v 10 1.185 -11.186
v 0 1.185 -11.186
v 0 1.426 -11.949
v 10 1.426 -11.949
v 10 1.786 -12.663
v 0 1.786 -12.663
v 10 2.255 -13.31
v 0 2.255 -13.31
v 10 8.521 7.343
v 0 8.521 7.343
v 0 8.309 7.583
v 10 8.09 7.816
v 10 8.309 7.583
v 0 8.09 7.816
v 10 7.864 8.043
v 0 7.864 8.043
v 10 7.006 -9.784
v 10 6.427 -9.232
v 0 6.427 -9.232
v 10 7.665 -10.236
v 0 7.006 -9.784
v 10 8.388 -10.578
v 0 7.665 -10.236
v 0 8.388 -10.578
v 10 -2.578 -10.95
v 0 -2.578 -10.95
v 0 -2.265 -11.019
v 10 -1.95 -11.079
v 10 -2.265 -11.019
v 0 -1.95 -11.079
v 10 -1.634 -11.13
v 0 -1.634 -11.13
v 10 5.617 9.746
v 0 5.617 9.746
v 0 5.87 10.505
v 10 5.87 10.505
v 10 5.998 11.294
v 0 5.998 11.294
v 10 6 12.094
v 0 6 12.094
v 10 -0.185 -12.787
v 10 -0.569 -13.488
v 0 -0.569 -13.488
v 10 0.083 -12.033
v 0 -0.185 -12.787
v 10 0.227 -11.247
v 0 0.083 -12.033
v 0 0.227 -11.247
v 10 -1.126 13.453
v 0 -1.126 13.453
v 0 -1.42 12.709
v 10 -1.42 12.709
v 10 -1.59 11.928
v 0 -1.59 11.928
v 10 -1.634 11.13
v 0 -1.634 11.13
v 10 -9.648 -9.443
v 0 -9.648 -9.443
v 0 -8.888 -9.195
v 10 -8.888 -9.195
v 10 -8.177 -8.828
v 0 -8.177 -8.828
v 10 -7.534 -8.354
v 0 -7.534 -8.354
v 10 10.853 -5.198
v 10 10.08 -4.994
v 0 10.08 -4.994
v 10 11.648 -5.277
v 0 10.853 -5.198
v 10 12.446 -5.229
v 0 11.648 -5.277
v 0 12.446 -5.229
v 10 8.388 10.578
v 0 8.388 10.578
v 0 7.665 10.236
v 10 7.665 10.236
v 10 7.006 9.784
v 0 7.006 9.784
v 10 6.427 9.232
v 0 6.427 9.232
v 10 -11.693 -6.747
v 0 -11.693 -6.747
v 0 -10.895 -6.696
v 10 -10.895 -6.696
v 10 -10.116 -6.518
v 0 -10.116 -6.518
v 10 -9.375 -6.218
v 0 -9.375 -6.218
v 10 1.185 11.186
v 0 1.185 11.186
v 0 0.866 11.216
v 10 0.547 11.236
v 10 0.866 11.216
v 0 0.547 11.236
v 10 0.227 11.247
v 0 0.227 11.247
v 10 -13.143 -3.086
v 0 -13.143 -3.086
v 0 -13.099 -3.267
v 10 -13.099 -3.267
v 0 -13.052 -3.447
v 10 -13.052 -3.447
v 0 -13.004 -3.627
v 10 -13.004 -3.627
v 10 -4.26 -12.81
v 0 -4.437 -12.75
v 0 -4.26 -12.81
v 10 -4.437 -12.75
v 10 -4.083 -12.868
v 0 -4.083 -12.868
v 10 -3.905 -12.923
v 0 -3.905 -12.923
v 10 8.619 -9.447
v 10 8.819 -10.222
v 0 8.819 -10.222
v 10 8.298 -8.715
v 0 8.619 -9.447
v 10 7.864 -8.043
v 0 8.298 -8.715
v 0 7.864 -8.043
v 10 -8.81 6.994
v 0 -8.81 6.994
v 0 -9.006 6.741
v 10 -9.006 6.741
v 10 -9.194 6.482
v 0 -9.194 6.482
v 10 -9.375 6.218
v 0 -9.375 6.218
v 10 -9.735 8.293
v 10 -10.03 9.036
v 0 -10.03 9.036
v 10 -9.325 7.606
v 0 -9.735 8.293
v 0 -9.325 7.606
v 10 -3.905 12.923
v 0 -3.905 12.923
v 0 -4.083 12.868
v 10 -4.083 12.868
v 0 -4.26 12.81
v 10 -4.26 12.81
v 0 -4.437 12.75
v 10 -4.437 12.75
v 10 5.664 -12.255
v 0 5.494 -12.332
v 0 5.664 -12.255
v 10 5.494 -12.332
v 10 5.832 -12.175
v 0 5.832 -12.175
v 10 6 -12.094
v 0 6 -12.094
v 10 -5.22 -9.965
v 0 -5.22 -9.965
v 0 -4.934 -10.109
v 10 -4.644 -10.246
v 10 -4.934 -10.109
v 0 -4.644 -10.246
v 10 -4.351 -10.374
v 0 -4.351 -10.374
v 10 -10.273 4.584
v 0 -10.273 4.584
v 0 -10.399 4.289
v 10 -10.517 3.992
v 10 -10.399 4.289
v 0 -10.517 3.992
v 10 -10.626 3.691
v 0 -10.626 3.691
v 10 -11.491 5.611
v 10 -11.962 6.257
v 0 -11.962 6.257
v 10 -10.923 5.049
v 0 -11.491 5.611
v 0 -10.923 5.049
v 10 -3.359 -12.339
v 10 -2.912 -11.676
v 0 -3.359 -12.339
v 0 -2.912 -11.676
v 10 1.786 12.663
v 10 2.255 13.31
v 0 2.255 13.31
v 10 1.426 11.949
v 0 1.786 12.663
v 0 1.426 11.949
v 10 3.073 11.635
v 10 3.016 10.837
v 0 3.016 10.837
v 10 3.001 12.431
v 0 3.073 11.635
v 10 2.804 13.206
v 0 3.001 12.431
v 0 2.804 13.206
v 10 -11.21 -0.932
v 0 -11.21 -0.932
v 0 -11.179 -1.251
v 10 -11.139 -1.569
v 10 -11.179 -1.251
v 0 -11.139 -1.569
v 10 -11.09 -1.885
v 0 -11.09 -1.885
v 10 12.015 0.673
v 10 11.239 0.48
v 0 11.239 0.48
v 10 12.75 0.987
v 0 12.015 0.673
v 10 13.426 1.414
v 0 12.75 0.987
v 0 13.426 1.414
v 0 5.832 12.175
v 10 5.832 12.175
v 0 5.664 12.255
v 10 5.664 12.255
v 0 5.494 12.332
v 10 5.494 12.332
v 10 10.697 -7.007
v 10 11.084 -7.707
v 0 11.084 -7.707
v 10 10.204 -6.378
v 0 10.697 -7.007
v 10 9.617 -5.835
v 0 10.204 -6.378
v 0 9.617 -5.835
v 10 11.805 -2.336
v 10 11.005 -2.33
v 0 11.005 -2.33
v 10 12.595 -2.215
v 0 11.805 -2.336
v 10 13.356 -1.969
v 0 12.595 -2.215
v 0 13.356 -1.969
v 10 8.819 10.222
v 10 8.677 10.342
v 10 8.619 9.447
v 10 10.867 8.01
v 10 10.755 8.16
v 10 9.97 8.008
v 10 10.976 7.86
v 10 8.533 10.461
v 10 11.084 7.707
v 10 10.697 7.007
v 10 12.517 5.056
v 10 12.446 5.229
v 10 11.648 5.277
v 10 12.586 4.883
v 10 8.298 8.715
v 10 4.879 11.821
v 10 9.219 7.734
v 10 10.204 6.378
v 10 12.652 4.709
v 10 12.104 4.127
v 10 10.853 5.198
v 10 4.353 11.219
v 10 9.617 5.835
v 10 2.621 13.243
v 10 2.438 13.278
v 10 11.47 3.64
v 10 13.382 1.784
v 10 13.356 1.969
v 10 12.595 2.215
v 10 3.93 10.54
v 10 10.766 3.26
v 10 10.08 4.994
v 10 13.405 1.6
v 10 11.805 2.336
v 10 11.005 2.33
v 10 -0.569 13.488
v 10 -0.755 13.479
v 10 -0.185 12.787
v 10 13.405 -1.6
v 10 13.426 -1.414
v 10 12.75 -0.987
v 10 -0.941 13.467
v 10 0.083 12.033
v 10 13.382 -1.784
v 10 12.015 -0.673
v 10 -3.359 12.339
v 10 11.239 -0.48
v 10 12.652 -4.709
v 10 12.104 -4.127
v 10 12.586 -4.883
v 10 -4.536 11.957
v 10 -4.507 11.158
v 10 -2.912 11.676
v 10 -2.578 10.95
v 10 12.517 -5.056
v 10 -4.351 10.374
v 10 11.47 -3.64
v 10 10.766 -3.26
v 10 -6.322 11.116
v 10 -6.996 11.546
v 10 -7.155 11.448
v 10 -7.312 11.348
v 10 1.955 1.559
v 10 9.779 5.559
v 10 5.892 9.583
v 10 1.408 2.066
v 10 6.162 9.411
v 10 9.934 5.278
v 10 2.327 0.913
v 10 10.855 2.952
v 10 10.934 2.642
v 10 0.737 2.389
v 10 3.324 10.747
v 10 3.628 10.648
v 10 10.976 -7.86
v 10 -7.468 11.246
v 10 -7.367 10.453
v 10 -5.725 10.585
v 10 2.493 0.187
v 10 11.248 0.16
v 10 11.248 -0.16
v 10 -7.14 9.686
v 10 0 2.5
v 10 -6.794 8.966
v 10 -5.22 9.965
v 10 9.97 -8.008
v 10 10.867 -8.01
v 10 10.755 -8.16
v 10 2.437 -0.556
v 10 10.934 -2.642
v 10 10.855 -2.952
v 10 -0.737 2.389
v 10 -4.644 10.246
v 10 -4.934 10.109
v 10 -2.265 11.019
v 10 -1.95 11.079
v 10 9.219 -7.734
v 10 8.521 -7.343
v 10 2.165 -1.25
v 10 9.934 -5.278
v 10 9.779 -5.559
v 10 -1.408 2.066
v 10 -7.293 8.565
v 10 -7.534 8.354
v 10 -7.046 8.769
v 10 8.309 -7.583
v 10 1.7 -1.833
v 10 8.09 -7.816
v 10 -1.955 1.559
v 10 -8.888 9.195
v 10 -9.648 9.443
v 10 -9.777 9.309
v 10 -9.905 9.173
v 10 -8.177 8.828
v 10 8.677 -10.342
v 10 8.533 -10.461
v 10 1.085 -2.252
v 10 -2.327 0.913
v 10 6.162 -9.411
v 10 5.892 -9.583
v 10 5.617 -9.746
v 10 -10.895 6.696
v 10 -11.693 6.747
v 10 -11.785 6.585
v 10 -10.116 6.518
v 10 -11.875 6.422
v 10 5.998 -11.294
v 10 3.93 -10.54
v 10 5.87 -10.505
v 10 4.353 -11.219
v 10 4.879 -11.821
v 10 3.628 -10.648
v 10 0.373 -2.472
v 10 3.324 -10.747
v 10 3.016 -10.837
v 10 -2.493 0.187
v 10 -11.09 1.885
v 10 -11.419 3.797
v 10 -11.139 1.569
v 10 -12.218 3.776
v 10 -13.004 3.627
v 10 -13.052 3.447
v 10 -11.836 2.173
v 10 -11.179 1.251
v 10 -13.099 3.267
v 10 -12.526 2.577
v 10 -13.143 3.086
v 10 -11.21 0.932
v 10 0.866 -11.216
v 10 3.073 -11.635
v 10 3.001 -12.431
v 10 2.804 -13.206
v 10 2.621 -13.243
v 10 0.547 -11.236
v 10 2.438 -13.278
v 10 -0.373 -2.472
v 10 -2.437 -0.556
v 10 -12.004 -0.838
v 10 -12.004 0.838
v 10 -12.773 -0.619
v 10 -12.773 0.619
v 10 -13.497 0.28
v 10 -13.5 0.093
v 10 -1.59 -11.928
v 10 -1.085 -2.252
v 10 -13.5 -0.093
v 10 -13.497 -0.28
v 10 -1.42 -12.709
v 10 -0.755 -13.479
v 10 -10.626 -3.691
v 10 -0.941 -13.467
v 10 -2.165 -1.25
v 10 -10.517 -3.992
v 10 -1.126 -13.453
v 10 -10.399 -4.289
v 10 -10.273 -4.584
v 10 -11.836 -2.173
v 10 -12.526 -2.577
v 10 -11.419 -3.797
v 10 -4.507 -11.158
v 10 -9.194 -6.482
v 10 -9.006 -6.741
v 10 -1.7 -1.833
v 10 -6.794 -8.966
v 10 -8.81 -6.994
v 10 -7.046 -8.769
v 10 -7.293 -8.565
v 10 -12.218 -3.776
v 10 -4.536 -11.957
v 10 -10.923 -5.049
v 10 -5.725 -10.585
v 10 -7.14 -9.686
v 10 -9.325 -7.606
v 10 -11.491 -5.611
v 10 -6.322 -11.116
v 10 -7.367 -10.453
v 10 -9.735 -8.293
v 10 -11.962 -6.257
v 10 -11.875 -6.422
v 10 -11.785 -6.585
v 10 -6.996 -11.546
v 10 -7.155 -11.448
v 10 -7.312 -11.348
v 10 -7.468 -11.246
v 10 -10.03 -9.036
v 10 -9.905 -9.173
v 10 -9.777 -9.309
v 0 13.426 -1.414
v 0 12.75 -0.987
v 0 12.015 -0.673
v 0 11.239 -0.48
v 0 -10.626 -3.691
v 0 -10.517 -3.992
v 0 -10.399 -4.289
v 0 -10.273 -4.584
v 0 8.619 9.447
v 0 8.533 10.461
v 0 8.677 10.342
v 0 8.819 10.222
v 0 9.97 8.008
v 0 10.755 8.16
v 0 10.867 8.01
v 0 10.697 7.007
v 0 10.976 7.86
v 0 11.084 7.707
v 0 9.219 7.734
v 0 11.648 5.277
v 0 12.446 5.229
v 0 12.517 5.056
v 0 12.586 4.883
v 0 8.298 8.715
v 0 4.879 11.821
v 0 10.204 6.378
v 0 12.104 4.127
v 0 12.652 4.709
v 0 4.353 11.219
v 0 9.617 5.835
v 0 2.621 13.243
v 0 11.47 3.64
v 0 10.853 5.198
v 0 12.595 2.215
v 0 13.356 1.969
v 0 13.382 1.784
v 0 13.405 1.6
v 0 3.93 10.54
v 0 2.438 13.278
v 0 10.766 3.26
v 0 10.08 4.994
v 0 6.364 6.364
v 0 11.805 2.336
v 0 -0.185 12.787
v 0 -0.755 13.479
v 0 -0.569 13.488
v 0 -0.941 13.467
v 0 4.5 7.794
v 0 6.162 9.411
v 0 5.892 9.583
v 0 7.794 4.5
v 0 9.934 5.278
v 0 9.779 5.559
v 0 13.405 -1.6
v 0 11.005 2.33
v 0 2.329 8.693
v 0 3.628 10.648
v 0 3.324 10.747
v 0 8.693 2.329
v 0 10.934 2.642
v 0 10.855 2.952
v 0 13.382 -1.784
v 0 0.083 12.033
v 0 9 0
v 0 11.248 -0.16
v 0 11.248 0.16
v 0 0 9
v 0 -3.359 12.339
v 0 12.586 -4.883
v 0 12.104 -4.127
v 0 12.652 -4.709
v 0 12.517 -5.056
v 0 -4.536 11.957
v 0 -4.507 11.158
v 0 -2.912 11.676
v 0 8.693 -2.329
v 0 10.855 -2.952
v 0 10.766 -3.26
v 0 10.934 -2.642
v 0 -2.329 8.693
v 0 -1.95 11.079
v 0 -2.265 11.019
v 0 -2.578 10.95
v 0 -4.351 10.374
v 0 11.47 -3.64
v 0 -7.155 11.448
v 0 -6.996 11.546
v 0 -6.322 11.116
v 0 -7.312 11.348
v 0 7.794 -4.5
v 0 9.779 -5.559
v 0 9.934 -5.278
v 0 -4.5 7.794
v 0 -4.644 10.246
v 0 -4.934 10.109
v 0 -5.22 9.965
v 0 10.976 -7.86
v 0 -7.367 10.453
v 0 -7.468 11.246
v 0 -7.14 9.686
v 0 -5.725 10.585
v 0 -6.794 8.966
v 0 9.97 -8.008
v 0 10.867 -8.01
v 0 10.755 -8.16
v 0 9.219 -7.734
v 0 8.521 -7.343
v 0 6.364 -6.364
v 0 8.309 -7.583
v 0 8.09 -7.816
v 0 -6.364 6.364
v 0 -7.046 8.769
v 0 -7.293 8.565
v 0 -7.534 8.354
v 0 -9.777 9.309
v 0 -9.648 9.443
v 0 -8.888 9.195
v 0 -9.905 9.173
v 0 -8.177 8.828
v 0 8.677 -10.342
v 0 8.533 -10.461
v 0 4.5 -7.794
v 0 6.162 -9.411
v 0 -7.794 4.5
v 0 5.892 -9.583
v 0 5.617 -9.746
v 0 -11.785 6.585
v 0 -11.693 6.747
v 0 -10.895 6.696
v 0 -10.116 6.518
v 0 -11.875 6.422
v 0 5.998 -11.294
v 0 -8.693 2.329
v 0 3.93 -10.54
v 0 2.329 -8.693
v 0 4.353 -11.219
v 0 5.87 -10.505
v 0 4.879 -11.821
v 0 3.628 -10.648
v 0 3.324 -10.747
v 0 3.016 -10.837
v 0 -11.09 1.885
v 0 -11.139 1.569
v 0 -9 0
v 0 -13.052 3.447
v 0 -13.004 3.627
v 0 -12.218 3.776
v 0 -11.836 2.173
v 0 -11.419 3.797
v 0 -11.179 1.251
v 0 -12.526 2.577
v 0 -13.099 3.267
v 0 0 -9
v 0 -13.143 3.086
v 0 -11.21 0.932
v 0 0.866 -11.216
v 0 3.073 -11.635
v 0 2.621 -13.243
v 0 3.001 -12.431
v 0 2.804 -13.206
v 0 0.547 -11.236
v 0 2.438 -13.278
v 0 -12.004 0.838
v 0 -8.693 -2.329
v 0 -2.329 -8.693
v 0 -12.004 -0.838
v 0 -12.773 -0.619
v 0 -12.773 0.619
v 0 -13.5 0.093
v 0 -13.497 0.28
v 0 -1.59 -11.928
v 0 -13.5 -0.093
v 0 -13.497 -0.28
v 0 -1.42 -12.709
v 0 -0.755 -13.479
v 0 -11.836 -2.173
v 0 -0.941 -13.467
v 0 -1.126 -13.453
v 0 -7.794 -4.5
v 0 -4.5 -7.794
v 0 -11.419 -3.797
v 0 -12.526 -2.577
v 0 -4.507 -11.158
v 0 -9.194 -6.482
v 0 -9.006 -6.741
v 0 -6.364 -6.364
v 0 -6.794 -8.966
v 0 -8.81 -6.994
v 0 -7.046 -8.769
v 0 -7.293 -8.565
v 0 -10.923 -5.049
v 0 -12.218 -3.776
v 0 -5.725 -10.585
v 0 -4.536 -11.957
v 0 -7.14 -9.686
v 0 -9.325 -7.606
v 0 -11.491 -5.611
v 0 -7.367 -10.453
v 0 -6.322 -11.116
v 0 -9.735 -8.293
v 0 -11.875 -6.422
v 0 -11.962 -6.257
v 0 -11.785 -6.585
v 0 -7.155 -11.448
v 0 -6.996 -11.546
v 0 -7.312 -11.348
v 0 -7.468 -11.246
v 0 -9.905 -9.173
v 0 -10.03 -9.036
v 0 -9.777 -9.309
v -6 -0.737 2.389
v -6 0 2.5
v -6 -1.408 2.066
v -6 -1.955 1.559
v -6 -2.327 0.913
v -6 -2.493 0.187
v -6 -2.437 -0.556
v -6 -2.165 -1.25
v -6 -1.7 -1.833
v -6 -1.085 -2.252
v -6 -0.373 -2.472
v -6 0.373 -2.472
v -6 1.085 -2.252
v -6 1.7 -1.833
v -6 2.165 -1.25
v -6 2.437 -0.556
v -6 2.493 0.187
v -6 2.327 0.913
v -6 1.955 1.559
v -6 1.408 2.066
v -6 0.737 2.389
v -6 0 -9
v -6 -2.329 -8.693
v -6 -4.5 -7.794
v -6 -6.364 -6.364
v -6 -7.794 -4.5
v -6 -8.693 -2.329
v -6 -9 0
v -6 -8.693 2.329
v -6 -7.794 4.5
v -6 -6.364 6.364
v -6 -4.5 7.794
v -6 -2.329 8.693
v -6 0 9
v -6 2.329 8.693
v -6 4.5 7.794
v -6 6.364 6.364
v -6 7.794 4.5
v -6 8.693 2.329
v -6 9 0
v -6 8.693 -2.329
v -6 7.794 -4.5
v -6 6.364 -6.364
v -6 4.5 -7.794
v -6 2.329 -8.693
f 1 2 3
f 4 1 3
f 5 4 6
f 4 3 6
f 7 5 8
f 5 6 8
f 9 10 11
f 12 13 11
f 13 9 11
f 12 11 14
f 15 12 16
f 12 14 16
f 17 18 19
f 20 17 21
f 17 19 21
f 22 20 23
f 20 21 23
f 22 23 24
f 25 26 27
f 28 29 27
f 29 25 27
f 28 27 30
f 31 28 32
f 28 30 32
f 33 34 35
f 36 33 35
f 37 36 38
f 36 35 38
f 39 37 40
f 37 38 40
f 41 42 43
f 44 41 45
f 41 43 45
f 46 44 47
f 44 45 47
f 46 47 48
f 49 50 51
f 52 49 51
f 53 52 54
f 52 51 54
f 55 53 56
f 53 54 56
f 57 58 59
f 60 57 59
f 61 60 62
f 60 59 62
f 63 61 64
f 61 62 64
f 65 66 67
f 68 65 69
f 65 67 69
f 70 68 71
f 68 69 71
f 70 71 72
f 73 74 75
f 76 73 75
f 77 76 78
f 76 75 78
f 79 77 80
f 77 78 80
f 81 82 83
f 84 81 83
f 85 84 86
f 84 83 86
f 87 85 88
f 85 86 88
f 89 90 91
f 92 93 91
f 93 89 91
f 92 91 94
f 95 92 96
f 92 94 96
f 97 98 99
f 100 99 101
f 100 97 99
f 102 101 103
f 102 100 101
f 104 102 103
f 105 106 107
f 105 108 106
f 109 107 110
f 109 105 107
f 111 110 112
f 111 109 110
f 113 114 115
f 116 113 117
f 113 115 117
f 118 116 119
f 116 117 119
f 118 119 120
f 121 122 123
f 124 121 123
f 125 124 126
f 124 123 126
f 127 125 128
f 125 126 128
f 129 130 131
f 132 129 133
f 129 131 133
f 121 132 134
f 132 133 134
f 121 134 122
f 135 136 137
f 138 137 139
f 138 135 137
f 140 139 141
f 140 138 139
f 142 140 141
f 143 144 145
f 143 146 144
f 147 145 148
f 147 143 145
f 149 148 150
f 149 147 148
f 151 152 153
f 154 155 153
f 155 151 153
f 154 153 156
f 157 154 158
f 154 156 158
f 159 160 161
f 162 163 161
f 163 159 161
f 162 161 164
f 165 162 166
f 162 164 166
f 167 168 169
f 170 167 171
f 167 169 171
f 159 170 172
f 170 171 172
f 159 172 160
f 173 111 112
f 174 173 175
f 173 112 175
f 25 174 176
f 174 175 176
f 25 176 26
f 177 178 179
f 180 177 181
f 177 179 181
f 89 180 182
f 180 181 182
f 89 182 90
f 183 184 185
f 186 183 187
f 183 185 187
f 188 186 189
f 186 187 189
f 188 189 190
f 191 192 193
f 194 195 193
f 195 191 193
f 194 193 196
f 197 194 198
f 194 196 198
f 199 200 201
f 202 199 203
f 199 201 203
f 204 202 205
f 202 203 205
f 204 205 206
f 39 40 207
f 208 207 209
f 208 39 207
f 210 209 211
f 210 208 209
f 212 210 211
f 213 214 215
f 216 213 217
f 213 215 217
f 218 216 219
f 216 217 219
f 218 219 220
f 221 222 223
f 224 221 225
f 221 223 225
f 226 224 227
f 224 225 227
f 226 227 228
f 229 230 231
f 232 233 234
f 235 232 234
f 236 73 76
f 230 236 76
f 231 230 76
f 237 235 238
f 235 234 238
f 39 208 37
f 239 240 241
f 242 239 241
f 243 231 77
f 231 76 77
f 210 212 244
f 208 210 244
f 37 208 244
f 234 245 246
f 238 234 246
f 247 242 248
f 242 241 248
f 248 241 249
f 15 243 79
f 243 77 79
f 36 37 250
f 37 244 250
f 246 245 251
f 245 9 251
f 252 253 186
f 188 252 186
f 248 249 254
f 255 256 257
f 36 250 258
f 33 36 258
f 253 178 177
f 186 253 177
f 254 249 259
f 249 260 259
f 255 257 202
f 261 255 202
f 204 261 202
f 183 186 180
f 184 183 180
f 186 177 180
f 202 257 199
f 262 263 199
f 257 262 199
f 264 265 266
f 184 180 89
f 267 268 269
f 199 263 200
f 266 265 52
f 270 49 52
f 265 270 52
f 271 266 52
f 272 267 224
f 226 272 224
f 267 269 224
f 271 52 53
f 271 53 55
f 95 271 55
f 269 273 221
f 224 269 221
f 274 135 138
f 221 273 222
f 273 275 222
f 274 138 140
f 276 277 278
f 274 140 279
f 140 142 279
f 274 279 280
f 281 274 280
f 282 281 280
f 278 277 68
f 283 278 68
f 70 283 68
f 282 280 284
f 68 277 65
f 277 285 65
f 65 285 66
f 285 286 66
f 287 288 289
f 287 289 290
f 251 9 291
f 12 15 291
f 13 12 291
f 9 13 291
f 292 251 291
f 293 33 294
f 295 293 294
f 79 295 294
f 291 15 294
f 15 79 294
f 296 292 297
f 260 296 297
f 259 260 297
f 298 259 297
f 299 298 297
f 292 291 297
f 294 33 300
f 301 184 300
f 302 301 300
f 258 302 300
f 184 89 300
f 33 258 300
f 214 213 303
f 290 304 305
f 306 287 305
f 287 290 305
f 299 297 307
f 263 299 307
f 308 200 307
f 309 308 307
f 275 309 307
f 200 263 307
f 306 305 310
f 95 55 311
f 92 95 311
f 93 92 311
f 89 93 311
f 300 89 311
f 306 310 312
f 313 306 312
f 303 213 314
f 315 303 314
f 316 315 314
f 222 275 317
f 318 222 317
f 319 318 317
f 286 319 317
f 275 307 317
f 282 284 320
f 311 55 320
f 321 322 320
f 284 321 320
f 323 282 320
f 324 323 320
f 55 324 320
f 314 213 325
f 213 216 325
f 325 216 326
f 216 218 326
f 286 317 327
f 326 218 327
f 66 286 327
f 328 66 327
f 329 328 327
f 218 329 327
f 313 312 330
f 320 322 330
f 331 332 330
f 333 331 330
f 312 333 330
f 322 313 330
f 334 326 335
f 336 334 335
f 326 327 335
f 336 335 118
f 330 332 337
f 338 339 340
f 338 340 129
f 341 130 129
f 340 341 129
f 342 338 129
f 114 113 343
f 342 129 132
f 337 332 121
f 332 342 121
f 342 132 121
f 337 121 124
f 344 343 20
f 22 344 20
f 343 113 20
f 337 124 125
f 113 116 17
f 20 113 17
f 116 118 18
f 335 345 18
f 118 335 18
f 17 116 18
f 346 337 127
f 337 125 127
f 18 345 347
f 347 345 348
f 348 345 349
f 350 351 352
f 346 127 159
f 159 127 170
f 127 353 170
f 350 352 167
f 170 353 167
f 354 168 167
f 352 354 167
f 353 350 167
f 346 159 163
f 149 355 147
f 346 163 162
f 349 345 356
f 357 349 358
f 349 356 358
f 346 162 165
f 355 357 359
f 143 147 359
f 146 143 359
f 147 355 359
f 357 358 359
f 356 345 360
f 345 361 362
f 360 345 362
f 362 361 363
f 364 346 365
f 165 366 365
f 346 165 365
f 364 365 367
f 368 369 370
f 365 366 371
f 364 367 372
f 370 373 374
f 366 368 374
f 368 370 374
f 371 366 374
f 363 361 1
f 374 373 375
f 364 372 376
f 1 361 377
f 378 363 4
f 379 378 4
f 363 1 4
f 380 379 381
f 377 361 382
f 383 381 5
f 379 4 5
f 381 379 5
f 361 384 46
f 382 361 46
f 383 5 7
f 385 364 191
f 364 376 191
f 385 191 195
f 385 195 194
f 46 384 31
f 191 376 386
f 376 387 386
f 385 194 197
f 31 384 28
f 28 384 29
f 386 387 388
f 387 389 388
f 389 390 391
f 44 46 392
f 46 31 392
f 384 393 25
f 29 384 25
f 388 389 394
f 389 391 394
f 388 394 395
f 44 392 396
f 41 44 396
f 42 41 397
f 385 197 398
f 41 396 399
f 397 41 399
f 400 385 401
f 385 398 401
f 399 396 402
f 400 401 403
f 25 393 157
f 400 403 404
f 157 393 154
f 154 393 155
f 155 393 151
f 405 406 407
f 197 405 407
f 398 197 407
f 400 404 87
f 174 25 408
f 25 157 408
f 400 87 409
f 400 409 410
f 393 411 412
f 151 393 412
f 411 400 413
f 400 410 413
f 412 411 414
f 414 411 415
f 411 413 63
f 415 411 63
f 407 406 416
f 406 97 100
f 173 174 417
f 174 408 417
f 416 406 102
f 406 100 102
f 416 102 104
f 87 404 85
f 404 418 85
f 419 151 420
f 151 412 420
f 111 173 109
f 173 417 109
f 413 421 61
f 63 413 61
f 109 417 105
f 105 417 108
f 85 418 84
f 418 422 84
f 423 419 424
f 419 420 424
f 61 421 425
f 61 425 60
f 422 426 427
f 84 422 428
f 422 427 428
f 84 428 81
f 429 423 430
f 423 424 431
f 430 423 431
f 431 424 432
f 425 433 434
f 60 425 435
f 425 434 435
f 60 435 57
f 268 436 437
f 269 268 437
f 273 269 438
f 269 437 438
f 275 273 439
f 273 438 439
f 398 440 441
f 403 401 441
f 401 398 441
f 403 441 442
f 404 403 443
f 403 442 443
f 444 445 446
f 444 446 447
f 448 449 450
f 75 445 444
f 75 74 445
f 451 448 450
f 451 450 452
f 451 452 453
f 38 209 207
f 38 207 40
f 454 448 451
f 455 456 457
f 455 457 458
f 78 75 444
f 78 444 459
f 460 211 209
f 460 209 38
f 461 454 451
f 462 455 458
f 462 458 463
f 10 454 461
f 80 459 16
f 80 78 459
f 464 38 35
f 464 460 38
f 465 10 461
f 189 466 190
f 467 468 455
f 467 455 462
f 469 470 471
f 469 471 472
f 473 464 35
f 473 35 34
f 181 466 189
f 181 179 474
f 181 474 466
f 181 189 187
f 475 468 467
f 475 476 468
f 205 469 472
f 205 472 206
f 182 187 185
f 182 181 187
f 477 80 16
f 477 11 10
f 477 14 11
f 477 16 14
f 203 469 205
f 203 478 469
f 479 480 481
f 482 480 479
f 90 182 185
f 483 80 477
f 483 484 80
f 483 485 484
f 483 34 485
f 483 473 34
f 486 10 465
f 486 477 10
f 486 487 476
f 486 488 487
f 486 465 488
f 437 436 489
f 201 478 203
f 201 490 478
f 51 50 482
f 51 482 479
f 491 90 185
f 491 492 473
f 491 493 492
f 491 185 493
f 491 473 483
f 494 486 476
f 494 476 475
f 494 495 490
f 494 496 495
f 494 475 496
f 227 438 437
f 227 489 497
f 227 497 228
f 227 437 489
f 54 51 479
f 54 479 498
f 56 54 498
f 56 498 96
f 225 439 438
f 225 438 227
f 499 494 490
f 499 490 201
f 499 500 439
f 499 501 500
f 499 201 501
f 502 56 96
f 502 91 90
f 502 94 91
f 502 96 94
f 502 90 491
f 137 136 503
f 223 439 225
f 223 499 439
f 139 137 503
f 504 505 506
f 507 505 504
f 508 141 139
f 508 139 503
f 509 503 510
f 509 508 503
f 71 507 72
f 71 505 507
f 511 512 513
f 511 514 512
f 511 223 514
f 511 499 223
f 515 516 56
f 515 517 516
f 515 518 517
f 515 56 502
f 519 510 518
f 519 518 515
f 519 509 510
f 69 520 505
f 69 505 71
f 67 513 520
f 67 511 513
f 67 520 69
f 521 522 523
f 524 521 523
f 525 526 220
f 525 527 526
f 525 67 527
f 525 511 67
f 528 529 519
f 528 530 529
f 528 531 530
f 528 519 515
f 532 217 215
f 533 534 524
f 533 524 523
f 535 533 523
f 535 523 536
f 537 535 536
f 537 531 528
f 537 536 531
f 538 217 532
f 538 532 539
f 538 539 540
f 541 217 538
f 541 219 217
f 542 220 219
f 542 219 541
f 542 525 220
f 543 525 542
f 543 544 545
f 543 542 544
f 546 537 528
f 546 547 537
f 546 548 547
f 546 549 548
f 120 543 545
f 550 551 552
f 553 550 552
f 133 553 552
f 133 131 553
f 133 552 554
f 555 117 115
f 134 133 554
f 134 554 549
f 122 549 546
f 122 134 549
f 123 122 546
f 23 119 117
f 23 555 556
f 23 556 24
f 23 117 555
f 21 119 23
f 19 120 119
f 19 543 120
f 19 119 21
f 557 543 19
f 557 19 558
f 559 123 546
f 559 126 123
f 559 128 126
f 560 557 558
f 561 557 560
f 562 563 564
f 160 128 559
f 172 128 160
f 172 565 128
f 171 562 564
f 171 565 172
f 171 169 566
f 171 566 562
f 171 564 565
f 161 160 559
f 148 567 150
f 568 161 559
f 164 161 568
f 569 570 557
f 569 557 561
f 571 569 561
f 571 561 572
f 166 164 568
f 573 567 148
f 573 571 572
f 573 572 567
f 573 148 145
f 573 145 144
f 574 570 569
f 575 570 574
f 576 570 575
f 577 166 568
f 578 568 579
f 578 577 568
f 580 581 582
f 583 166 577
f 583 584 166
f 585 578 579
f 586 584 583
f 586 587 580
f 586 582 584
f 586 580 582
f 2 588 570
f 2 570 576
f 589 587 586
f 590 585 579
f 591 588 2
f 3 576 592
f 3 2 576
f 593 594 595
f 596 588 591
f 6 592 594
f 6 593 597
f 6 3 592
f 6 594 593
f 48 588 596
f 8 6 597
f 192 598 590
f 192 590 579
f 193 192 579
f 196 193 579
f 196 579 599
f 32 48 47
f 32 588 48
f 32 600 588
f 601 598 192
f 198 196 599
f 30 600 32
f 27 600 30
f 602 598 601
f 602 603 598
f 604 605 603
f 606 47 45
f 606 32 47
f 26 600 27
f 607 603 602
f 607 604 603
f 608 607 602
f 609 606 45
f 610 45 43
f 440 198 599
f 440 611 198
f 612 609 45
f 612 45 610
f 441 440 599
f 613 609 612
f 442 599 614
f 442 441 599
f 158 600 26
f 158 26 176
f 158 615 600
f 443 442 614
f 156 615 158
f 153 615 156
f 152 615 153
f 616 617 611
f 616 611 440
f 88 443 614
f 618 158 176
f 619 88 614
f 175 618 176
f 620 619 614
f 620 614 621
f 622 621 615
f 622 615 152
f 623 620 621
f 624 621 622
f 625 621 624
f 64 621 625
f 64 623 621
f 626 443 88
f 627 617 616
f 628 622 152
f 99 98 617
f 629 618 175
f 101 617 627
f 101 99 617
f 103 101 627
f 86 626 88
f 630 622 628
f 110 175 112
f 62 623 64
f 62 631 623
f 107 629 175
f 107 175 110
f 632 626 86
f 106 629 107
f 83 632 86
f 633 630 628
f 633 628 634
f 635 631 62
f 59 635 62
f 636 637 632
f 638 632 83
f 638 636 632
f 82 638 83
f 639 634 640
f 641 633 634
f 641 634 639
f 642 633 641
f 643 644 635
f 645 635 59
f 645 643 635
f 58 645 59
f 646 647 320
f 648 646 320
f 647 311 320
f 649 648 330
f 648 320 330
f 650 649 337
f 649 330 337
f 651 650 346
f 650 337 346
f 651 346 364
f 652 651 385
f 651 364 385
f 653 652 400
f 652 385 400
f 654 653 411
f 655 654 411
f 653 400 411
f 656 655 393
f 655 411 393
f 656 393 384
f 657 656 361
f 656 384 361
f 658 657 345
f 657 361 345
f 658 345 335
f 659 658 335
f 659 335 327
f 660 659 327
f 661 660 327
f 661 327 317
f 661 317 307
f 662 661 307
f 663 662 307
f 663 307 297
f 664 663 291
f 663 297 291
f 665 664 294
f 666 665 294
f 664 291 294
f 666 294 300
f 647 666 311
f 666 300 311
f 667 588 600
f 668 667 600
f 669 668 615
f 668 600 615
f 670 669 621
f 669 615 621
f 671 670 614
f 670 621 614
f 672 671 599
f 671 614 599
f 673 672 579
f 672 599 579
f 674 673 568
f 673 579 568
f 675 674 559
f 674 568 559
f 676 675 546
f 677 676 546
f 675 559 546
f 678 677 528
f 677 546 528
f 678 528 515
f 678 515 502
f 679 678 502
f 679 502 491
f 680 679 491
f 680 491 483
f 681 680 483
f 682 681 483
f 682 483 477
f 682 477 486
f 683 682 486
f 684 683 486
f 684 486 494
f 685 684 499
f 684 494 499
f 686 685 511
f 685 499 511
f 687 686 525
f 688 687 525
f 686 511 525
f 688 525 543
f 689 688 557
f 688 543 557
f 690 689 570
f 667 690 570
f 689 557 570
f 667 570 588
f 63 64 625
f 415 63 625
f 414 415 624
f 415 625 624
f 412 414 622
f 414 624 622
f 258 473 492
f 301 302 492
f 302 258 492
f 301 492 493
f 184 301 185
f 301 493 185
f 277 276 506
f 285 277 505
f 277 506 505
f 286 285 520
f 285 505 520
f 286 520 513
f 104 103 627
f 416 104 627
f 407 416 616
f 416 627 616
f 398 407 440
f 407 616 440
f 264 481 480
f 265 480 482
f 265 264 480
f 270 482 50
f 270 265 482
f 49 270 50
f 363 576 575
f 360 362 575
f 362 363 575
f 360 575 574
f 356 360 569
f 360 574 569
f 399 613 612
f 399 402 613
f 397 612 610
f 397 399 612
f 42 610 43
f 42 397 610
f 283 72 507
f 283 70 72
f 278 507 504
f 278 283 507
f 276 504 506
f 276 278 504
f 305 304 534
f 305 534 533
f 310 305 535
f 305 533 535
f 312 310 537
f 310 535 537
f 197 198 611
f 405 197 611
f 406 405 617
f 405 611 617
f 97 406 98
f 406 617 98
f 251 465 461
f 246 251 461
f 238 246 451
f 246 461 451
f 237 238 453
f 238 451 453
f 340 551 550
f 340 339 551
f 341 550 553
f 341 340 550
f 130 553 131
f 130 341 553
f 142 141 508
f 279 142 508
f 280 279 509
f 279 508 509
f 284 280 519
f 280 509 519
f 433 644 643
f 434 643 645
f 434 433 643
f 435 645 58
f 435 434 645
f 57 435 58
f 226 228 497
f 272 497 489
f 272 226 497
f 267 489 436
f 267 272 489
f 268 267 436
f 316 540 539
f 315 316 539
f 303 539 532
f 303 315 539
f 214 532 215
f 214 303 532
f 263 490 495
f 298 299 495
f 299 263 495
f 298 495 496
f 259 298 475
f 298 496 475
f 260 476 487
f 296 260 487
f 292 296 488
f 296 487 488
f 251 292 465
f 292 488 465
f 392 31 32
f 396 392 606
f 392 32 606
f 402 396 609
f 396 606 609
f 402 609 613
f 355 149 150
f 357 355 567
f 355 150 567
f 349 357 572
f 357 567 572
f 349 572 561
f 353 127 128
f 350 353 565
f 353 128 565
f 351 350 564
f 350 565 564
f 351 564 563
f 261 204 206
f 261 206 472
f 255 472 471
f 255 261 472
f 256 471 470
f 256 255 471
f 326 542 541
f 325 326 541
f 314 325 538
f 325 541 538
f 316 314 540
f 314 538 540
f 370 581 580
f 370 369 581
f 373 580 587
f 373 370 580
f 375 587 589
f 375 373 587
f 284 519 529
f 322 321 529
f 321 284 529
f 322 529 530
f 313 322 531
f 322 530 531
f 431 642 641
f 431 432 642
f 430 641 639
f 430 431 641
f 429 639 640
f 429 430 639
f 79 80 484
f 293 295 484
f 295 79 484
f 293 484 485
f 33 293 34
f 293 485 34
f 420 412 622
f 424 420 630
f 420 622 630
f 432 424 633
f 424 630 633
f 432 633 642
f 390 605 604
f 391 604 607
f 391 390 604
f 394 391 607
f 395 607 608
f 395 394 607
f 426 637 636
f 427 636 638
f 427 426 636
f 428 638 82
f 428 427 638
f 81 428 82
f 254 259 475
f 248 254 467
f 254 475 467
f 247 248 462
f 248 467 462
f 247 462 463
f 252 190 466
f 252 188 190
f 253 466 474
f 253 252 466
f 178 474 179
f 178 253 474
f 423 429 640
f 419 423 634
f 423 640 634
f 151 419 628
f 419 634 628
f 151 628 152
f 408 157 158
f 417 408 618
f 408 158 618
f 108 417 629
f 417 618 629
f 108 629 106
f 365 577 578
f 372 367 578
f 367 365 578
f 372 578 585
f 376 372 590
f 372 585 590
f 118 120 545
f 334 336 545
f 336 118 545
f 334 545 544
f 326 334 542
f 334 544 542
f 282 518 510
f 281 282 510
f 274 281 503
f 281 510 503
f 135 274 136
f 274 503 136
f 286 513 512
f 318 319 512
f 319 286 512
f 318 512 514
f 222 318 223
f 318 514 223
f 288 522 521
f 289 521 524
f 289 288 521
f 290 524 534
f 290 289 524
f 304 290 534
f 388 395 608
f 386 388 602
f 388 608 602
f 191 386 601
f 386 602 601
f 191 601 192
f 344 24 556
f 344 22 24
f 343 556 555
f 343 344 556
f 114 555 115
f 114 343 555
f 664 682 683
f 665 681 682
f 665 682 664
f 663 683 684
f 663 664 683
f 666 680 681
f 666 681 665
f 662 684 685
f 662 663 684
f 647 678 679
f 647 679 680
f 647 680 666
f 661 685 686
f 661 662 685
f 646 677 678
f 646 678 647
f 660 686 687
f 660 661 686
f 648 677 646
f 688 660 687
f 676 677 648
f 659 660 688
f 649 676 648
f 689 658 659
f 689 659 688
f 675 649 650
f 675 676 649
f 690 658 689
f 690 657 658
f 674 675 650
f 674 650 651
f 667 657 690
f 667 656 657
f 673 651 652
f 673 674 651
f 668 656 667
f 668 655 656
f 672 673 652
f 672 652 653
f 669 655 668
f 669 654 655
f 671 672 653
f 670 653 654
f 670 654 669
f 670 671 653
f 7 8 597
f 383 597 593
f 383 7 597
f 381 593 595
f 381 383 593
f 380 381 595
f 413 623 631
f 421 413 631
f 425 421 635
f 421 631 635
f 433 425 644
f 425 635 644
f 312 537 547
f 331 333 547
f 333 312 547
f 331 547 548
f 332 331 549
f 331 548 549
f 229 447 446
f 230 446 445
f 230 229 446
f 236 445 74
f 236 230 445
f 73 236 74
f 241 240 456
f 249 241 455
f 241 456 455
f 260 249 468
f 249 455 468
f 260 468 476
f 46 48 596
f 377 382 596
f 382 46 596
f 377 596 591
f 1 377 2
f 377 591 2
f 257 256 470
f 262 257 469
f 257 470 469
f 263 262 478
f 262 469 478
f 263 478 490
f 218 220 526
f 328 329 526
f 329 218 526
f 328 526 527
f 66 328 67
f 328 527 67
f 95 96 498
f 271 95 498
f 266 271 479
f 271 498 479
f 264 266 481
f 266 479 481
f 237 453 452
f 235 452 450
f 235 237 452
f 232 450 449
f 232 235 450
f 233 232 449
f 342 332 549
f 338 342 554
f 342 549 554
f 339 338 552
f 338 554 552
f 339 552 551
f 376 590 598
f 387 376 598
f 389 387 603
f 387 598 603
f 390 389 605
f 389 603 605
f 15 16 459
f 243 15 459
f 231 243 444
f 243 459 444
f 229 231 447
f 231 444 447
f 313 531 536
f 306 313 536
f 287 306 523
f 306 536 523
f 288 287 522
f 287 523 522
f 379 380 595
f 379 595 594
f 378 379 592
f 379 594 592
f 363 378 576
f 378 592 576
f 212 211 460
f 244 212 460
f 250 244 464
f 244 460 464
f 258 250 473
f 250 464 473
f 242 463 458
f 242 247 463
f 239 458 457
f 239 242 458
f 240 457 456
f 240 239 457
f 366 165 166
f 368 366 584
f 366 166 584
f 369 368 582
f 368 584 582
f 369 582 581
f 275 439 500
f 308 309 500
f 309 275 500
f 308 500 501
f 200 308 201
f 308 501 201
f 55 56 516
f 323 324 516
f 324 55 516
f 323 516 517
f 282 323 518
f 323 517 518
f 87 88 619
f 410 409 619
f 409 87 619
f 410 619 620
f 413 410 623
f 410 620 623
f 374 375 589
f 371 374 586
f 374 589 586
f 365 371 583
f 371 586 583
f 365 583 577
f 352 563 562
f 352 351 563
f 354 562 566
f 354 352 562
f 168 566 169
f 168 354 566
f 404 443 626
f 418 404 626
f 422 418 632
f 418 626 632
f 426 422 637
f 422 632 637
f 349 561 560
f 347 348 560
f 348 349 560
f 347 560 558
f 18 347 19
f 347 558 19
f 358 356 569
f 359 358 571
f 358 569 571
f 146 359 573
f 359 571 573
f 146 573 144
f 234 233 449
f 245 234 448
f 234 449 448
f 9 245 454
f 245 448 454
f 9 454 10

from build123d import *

# Parameters (mm, degrees)
BASPROSKE_W      = 10
BASPROSKE_H      = 13.5
TOOTHCUT_DEPTH   = 22.552262062
TEETHCUTS_COUNT  = 25
TEETHCUTS_ANGLE  = 345.6
HUBNEAONESKE_R   = 9
HUBNEARONE_DEPTH = 6.0000508
BORSKE_R         = 2.5
BORE_DEPTH       = 16.0000508


with BuildPart() as part:
    # BasProSke → Base-Revolve (revolve)
    with BuildSketch(Plane(origin=(0, 0, 0), x_dir=(1, 0, 0), z_dir=(0, 1, 0)), mode=Mode.PRIVATE) as base_revolve_sk:
        with Locations((5, 6.75)):
            Rectangle(BASPROSKE_W, BASPROSKE_H)
    revolve(base_revolve_sk.sketch.rotate(Axis((-10, 0, 0), (1, 0, 0)), 180), axis=Axis((-10, 0, 0), (1, 0, 0)))

    # TooCutSke → ToothCut (cut, through all)
    with BuildSketch(Plane(origin=(0, 0, 0), x_dir=(0, 0, -1), z_dir=(1, 0, 0))):
        with BuildLine():
            ThreePointArc((0.480087995, 11.238750665), (0, 11.249), (-0.480087995, 11.238750665))
            ThreePointArc((-0.480087995, 11.238750665), (-0.821124963, 12.40220054), (-1.432168974, 13.449361962))
            ThreePointArc((-1.432168974, 13.449361962), (0, 13.5254), (1.432168974, 13.449361962))
            ThreePointArc((1.432168974, 13.449361962), (0.821124963, 12.40220054), (0.480087995, 11.238750665))
        make_face()
    toothcut = extrude(amount=TOOTHCUT_DEPTH, mode=Mode.SUBTRACT)

    # TeethCuts: ToothCut ×25 about axis
    teethcuts_axis = Axis((-10, 0, 0), (1, 0, 0))
    for i in range(1, TEETHCUTS_COUNT):
        add(toothcut.rotate(teethcuts_axis, i * TEETHCUTS_ANGLE / (TEETHCUTS_COUNT - 1)), mode=Mode.SUBTRACT)

    # HubNeaOneSke → HubNearOne (add)
    with BuildSketch(Plane.ZY):
        with Locations(Location((0, 0, 0), (0, 0, 180))):
            Circle(HUBNEAONESKE_R)
    extrude(amount=HUBNEARONE_DEPTH)

    # BorSke → Bore (cut, symmetric)
    with BuildSketch(Plane(origin=(0, 0, 0), x_dir=(0, 0, -1), z_dir=(1, 0, 0))):
        with Locations(Location((0, 0, 0), (0, 0, 180))):
            Circle(BORSKE_R)
    extrude(amount=BORE_DEPTH, both=True, mode=Mode.SUBTRACT)


solid = part.part
